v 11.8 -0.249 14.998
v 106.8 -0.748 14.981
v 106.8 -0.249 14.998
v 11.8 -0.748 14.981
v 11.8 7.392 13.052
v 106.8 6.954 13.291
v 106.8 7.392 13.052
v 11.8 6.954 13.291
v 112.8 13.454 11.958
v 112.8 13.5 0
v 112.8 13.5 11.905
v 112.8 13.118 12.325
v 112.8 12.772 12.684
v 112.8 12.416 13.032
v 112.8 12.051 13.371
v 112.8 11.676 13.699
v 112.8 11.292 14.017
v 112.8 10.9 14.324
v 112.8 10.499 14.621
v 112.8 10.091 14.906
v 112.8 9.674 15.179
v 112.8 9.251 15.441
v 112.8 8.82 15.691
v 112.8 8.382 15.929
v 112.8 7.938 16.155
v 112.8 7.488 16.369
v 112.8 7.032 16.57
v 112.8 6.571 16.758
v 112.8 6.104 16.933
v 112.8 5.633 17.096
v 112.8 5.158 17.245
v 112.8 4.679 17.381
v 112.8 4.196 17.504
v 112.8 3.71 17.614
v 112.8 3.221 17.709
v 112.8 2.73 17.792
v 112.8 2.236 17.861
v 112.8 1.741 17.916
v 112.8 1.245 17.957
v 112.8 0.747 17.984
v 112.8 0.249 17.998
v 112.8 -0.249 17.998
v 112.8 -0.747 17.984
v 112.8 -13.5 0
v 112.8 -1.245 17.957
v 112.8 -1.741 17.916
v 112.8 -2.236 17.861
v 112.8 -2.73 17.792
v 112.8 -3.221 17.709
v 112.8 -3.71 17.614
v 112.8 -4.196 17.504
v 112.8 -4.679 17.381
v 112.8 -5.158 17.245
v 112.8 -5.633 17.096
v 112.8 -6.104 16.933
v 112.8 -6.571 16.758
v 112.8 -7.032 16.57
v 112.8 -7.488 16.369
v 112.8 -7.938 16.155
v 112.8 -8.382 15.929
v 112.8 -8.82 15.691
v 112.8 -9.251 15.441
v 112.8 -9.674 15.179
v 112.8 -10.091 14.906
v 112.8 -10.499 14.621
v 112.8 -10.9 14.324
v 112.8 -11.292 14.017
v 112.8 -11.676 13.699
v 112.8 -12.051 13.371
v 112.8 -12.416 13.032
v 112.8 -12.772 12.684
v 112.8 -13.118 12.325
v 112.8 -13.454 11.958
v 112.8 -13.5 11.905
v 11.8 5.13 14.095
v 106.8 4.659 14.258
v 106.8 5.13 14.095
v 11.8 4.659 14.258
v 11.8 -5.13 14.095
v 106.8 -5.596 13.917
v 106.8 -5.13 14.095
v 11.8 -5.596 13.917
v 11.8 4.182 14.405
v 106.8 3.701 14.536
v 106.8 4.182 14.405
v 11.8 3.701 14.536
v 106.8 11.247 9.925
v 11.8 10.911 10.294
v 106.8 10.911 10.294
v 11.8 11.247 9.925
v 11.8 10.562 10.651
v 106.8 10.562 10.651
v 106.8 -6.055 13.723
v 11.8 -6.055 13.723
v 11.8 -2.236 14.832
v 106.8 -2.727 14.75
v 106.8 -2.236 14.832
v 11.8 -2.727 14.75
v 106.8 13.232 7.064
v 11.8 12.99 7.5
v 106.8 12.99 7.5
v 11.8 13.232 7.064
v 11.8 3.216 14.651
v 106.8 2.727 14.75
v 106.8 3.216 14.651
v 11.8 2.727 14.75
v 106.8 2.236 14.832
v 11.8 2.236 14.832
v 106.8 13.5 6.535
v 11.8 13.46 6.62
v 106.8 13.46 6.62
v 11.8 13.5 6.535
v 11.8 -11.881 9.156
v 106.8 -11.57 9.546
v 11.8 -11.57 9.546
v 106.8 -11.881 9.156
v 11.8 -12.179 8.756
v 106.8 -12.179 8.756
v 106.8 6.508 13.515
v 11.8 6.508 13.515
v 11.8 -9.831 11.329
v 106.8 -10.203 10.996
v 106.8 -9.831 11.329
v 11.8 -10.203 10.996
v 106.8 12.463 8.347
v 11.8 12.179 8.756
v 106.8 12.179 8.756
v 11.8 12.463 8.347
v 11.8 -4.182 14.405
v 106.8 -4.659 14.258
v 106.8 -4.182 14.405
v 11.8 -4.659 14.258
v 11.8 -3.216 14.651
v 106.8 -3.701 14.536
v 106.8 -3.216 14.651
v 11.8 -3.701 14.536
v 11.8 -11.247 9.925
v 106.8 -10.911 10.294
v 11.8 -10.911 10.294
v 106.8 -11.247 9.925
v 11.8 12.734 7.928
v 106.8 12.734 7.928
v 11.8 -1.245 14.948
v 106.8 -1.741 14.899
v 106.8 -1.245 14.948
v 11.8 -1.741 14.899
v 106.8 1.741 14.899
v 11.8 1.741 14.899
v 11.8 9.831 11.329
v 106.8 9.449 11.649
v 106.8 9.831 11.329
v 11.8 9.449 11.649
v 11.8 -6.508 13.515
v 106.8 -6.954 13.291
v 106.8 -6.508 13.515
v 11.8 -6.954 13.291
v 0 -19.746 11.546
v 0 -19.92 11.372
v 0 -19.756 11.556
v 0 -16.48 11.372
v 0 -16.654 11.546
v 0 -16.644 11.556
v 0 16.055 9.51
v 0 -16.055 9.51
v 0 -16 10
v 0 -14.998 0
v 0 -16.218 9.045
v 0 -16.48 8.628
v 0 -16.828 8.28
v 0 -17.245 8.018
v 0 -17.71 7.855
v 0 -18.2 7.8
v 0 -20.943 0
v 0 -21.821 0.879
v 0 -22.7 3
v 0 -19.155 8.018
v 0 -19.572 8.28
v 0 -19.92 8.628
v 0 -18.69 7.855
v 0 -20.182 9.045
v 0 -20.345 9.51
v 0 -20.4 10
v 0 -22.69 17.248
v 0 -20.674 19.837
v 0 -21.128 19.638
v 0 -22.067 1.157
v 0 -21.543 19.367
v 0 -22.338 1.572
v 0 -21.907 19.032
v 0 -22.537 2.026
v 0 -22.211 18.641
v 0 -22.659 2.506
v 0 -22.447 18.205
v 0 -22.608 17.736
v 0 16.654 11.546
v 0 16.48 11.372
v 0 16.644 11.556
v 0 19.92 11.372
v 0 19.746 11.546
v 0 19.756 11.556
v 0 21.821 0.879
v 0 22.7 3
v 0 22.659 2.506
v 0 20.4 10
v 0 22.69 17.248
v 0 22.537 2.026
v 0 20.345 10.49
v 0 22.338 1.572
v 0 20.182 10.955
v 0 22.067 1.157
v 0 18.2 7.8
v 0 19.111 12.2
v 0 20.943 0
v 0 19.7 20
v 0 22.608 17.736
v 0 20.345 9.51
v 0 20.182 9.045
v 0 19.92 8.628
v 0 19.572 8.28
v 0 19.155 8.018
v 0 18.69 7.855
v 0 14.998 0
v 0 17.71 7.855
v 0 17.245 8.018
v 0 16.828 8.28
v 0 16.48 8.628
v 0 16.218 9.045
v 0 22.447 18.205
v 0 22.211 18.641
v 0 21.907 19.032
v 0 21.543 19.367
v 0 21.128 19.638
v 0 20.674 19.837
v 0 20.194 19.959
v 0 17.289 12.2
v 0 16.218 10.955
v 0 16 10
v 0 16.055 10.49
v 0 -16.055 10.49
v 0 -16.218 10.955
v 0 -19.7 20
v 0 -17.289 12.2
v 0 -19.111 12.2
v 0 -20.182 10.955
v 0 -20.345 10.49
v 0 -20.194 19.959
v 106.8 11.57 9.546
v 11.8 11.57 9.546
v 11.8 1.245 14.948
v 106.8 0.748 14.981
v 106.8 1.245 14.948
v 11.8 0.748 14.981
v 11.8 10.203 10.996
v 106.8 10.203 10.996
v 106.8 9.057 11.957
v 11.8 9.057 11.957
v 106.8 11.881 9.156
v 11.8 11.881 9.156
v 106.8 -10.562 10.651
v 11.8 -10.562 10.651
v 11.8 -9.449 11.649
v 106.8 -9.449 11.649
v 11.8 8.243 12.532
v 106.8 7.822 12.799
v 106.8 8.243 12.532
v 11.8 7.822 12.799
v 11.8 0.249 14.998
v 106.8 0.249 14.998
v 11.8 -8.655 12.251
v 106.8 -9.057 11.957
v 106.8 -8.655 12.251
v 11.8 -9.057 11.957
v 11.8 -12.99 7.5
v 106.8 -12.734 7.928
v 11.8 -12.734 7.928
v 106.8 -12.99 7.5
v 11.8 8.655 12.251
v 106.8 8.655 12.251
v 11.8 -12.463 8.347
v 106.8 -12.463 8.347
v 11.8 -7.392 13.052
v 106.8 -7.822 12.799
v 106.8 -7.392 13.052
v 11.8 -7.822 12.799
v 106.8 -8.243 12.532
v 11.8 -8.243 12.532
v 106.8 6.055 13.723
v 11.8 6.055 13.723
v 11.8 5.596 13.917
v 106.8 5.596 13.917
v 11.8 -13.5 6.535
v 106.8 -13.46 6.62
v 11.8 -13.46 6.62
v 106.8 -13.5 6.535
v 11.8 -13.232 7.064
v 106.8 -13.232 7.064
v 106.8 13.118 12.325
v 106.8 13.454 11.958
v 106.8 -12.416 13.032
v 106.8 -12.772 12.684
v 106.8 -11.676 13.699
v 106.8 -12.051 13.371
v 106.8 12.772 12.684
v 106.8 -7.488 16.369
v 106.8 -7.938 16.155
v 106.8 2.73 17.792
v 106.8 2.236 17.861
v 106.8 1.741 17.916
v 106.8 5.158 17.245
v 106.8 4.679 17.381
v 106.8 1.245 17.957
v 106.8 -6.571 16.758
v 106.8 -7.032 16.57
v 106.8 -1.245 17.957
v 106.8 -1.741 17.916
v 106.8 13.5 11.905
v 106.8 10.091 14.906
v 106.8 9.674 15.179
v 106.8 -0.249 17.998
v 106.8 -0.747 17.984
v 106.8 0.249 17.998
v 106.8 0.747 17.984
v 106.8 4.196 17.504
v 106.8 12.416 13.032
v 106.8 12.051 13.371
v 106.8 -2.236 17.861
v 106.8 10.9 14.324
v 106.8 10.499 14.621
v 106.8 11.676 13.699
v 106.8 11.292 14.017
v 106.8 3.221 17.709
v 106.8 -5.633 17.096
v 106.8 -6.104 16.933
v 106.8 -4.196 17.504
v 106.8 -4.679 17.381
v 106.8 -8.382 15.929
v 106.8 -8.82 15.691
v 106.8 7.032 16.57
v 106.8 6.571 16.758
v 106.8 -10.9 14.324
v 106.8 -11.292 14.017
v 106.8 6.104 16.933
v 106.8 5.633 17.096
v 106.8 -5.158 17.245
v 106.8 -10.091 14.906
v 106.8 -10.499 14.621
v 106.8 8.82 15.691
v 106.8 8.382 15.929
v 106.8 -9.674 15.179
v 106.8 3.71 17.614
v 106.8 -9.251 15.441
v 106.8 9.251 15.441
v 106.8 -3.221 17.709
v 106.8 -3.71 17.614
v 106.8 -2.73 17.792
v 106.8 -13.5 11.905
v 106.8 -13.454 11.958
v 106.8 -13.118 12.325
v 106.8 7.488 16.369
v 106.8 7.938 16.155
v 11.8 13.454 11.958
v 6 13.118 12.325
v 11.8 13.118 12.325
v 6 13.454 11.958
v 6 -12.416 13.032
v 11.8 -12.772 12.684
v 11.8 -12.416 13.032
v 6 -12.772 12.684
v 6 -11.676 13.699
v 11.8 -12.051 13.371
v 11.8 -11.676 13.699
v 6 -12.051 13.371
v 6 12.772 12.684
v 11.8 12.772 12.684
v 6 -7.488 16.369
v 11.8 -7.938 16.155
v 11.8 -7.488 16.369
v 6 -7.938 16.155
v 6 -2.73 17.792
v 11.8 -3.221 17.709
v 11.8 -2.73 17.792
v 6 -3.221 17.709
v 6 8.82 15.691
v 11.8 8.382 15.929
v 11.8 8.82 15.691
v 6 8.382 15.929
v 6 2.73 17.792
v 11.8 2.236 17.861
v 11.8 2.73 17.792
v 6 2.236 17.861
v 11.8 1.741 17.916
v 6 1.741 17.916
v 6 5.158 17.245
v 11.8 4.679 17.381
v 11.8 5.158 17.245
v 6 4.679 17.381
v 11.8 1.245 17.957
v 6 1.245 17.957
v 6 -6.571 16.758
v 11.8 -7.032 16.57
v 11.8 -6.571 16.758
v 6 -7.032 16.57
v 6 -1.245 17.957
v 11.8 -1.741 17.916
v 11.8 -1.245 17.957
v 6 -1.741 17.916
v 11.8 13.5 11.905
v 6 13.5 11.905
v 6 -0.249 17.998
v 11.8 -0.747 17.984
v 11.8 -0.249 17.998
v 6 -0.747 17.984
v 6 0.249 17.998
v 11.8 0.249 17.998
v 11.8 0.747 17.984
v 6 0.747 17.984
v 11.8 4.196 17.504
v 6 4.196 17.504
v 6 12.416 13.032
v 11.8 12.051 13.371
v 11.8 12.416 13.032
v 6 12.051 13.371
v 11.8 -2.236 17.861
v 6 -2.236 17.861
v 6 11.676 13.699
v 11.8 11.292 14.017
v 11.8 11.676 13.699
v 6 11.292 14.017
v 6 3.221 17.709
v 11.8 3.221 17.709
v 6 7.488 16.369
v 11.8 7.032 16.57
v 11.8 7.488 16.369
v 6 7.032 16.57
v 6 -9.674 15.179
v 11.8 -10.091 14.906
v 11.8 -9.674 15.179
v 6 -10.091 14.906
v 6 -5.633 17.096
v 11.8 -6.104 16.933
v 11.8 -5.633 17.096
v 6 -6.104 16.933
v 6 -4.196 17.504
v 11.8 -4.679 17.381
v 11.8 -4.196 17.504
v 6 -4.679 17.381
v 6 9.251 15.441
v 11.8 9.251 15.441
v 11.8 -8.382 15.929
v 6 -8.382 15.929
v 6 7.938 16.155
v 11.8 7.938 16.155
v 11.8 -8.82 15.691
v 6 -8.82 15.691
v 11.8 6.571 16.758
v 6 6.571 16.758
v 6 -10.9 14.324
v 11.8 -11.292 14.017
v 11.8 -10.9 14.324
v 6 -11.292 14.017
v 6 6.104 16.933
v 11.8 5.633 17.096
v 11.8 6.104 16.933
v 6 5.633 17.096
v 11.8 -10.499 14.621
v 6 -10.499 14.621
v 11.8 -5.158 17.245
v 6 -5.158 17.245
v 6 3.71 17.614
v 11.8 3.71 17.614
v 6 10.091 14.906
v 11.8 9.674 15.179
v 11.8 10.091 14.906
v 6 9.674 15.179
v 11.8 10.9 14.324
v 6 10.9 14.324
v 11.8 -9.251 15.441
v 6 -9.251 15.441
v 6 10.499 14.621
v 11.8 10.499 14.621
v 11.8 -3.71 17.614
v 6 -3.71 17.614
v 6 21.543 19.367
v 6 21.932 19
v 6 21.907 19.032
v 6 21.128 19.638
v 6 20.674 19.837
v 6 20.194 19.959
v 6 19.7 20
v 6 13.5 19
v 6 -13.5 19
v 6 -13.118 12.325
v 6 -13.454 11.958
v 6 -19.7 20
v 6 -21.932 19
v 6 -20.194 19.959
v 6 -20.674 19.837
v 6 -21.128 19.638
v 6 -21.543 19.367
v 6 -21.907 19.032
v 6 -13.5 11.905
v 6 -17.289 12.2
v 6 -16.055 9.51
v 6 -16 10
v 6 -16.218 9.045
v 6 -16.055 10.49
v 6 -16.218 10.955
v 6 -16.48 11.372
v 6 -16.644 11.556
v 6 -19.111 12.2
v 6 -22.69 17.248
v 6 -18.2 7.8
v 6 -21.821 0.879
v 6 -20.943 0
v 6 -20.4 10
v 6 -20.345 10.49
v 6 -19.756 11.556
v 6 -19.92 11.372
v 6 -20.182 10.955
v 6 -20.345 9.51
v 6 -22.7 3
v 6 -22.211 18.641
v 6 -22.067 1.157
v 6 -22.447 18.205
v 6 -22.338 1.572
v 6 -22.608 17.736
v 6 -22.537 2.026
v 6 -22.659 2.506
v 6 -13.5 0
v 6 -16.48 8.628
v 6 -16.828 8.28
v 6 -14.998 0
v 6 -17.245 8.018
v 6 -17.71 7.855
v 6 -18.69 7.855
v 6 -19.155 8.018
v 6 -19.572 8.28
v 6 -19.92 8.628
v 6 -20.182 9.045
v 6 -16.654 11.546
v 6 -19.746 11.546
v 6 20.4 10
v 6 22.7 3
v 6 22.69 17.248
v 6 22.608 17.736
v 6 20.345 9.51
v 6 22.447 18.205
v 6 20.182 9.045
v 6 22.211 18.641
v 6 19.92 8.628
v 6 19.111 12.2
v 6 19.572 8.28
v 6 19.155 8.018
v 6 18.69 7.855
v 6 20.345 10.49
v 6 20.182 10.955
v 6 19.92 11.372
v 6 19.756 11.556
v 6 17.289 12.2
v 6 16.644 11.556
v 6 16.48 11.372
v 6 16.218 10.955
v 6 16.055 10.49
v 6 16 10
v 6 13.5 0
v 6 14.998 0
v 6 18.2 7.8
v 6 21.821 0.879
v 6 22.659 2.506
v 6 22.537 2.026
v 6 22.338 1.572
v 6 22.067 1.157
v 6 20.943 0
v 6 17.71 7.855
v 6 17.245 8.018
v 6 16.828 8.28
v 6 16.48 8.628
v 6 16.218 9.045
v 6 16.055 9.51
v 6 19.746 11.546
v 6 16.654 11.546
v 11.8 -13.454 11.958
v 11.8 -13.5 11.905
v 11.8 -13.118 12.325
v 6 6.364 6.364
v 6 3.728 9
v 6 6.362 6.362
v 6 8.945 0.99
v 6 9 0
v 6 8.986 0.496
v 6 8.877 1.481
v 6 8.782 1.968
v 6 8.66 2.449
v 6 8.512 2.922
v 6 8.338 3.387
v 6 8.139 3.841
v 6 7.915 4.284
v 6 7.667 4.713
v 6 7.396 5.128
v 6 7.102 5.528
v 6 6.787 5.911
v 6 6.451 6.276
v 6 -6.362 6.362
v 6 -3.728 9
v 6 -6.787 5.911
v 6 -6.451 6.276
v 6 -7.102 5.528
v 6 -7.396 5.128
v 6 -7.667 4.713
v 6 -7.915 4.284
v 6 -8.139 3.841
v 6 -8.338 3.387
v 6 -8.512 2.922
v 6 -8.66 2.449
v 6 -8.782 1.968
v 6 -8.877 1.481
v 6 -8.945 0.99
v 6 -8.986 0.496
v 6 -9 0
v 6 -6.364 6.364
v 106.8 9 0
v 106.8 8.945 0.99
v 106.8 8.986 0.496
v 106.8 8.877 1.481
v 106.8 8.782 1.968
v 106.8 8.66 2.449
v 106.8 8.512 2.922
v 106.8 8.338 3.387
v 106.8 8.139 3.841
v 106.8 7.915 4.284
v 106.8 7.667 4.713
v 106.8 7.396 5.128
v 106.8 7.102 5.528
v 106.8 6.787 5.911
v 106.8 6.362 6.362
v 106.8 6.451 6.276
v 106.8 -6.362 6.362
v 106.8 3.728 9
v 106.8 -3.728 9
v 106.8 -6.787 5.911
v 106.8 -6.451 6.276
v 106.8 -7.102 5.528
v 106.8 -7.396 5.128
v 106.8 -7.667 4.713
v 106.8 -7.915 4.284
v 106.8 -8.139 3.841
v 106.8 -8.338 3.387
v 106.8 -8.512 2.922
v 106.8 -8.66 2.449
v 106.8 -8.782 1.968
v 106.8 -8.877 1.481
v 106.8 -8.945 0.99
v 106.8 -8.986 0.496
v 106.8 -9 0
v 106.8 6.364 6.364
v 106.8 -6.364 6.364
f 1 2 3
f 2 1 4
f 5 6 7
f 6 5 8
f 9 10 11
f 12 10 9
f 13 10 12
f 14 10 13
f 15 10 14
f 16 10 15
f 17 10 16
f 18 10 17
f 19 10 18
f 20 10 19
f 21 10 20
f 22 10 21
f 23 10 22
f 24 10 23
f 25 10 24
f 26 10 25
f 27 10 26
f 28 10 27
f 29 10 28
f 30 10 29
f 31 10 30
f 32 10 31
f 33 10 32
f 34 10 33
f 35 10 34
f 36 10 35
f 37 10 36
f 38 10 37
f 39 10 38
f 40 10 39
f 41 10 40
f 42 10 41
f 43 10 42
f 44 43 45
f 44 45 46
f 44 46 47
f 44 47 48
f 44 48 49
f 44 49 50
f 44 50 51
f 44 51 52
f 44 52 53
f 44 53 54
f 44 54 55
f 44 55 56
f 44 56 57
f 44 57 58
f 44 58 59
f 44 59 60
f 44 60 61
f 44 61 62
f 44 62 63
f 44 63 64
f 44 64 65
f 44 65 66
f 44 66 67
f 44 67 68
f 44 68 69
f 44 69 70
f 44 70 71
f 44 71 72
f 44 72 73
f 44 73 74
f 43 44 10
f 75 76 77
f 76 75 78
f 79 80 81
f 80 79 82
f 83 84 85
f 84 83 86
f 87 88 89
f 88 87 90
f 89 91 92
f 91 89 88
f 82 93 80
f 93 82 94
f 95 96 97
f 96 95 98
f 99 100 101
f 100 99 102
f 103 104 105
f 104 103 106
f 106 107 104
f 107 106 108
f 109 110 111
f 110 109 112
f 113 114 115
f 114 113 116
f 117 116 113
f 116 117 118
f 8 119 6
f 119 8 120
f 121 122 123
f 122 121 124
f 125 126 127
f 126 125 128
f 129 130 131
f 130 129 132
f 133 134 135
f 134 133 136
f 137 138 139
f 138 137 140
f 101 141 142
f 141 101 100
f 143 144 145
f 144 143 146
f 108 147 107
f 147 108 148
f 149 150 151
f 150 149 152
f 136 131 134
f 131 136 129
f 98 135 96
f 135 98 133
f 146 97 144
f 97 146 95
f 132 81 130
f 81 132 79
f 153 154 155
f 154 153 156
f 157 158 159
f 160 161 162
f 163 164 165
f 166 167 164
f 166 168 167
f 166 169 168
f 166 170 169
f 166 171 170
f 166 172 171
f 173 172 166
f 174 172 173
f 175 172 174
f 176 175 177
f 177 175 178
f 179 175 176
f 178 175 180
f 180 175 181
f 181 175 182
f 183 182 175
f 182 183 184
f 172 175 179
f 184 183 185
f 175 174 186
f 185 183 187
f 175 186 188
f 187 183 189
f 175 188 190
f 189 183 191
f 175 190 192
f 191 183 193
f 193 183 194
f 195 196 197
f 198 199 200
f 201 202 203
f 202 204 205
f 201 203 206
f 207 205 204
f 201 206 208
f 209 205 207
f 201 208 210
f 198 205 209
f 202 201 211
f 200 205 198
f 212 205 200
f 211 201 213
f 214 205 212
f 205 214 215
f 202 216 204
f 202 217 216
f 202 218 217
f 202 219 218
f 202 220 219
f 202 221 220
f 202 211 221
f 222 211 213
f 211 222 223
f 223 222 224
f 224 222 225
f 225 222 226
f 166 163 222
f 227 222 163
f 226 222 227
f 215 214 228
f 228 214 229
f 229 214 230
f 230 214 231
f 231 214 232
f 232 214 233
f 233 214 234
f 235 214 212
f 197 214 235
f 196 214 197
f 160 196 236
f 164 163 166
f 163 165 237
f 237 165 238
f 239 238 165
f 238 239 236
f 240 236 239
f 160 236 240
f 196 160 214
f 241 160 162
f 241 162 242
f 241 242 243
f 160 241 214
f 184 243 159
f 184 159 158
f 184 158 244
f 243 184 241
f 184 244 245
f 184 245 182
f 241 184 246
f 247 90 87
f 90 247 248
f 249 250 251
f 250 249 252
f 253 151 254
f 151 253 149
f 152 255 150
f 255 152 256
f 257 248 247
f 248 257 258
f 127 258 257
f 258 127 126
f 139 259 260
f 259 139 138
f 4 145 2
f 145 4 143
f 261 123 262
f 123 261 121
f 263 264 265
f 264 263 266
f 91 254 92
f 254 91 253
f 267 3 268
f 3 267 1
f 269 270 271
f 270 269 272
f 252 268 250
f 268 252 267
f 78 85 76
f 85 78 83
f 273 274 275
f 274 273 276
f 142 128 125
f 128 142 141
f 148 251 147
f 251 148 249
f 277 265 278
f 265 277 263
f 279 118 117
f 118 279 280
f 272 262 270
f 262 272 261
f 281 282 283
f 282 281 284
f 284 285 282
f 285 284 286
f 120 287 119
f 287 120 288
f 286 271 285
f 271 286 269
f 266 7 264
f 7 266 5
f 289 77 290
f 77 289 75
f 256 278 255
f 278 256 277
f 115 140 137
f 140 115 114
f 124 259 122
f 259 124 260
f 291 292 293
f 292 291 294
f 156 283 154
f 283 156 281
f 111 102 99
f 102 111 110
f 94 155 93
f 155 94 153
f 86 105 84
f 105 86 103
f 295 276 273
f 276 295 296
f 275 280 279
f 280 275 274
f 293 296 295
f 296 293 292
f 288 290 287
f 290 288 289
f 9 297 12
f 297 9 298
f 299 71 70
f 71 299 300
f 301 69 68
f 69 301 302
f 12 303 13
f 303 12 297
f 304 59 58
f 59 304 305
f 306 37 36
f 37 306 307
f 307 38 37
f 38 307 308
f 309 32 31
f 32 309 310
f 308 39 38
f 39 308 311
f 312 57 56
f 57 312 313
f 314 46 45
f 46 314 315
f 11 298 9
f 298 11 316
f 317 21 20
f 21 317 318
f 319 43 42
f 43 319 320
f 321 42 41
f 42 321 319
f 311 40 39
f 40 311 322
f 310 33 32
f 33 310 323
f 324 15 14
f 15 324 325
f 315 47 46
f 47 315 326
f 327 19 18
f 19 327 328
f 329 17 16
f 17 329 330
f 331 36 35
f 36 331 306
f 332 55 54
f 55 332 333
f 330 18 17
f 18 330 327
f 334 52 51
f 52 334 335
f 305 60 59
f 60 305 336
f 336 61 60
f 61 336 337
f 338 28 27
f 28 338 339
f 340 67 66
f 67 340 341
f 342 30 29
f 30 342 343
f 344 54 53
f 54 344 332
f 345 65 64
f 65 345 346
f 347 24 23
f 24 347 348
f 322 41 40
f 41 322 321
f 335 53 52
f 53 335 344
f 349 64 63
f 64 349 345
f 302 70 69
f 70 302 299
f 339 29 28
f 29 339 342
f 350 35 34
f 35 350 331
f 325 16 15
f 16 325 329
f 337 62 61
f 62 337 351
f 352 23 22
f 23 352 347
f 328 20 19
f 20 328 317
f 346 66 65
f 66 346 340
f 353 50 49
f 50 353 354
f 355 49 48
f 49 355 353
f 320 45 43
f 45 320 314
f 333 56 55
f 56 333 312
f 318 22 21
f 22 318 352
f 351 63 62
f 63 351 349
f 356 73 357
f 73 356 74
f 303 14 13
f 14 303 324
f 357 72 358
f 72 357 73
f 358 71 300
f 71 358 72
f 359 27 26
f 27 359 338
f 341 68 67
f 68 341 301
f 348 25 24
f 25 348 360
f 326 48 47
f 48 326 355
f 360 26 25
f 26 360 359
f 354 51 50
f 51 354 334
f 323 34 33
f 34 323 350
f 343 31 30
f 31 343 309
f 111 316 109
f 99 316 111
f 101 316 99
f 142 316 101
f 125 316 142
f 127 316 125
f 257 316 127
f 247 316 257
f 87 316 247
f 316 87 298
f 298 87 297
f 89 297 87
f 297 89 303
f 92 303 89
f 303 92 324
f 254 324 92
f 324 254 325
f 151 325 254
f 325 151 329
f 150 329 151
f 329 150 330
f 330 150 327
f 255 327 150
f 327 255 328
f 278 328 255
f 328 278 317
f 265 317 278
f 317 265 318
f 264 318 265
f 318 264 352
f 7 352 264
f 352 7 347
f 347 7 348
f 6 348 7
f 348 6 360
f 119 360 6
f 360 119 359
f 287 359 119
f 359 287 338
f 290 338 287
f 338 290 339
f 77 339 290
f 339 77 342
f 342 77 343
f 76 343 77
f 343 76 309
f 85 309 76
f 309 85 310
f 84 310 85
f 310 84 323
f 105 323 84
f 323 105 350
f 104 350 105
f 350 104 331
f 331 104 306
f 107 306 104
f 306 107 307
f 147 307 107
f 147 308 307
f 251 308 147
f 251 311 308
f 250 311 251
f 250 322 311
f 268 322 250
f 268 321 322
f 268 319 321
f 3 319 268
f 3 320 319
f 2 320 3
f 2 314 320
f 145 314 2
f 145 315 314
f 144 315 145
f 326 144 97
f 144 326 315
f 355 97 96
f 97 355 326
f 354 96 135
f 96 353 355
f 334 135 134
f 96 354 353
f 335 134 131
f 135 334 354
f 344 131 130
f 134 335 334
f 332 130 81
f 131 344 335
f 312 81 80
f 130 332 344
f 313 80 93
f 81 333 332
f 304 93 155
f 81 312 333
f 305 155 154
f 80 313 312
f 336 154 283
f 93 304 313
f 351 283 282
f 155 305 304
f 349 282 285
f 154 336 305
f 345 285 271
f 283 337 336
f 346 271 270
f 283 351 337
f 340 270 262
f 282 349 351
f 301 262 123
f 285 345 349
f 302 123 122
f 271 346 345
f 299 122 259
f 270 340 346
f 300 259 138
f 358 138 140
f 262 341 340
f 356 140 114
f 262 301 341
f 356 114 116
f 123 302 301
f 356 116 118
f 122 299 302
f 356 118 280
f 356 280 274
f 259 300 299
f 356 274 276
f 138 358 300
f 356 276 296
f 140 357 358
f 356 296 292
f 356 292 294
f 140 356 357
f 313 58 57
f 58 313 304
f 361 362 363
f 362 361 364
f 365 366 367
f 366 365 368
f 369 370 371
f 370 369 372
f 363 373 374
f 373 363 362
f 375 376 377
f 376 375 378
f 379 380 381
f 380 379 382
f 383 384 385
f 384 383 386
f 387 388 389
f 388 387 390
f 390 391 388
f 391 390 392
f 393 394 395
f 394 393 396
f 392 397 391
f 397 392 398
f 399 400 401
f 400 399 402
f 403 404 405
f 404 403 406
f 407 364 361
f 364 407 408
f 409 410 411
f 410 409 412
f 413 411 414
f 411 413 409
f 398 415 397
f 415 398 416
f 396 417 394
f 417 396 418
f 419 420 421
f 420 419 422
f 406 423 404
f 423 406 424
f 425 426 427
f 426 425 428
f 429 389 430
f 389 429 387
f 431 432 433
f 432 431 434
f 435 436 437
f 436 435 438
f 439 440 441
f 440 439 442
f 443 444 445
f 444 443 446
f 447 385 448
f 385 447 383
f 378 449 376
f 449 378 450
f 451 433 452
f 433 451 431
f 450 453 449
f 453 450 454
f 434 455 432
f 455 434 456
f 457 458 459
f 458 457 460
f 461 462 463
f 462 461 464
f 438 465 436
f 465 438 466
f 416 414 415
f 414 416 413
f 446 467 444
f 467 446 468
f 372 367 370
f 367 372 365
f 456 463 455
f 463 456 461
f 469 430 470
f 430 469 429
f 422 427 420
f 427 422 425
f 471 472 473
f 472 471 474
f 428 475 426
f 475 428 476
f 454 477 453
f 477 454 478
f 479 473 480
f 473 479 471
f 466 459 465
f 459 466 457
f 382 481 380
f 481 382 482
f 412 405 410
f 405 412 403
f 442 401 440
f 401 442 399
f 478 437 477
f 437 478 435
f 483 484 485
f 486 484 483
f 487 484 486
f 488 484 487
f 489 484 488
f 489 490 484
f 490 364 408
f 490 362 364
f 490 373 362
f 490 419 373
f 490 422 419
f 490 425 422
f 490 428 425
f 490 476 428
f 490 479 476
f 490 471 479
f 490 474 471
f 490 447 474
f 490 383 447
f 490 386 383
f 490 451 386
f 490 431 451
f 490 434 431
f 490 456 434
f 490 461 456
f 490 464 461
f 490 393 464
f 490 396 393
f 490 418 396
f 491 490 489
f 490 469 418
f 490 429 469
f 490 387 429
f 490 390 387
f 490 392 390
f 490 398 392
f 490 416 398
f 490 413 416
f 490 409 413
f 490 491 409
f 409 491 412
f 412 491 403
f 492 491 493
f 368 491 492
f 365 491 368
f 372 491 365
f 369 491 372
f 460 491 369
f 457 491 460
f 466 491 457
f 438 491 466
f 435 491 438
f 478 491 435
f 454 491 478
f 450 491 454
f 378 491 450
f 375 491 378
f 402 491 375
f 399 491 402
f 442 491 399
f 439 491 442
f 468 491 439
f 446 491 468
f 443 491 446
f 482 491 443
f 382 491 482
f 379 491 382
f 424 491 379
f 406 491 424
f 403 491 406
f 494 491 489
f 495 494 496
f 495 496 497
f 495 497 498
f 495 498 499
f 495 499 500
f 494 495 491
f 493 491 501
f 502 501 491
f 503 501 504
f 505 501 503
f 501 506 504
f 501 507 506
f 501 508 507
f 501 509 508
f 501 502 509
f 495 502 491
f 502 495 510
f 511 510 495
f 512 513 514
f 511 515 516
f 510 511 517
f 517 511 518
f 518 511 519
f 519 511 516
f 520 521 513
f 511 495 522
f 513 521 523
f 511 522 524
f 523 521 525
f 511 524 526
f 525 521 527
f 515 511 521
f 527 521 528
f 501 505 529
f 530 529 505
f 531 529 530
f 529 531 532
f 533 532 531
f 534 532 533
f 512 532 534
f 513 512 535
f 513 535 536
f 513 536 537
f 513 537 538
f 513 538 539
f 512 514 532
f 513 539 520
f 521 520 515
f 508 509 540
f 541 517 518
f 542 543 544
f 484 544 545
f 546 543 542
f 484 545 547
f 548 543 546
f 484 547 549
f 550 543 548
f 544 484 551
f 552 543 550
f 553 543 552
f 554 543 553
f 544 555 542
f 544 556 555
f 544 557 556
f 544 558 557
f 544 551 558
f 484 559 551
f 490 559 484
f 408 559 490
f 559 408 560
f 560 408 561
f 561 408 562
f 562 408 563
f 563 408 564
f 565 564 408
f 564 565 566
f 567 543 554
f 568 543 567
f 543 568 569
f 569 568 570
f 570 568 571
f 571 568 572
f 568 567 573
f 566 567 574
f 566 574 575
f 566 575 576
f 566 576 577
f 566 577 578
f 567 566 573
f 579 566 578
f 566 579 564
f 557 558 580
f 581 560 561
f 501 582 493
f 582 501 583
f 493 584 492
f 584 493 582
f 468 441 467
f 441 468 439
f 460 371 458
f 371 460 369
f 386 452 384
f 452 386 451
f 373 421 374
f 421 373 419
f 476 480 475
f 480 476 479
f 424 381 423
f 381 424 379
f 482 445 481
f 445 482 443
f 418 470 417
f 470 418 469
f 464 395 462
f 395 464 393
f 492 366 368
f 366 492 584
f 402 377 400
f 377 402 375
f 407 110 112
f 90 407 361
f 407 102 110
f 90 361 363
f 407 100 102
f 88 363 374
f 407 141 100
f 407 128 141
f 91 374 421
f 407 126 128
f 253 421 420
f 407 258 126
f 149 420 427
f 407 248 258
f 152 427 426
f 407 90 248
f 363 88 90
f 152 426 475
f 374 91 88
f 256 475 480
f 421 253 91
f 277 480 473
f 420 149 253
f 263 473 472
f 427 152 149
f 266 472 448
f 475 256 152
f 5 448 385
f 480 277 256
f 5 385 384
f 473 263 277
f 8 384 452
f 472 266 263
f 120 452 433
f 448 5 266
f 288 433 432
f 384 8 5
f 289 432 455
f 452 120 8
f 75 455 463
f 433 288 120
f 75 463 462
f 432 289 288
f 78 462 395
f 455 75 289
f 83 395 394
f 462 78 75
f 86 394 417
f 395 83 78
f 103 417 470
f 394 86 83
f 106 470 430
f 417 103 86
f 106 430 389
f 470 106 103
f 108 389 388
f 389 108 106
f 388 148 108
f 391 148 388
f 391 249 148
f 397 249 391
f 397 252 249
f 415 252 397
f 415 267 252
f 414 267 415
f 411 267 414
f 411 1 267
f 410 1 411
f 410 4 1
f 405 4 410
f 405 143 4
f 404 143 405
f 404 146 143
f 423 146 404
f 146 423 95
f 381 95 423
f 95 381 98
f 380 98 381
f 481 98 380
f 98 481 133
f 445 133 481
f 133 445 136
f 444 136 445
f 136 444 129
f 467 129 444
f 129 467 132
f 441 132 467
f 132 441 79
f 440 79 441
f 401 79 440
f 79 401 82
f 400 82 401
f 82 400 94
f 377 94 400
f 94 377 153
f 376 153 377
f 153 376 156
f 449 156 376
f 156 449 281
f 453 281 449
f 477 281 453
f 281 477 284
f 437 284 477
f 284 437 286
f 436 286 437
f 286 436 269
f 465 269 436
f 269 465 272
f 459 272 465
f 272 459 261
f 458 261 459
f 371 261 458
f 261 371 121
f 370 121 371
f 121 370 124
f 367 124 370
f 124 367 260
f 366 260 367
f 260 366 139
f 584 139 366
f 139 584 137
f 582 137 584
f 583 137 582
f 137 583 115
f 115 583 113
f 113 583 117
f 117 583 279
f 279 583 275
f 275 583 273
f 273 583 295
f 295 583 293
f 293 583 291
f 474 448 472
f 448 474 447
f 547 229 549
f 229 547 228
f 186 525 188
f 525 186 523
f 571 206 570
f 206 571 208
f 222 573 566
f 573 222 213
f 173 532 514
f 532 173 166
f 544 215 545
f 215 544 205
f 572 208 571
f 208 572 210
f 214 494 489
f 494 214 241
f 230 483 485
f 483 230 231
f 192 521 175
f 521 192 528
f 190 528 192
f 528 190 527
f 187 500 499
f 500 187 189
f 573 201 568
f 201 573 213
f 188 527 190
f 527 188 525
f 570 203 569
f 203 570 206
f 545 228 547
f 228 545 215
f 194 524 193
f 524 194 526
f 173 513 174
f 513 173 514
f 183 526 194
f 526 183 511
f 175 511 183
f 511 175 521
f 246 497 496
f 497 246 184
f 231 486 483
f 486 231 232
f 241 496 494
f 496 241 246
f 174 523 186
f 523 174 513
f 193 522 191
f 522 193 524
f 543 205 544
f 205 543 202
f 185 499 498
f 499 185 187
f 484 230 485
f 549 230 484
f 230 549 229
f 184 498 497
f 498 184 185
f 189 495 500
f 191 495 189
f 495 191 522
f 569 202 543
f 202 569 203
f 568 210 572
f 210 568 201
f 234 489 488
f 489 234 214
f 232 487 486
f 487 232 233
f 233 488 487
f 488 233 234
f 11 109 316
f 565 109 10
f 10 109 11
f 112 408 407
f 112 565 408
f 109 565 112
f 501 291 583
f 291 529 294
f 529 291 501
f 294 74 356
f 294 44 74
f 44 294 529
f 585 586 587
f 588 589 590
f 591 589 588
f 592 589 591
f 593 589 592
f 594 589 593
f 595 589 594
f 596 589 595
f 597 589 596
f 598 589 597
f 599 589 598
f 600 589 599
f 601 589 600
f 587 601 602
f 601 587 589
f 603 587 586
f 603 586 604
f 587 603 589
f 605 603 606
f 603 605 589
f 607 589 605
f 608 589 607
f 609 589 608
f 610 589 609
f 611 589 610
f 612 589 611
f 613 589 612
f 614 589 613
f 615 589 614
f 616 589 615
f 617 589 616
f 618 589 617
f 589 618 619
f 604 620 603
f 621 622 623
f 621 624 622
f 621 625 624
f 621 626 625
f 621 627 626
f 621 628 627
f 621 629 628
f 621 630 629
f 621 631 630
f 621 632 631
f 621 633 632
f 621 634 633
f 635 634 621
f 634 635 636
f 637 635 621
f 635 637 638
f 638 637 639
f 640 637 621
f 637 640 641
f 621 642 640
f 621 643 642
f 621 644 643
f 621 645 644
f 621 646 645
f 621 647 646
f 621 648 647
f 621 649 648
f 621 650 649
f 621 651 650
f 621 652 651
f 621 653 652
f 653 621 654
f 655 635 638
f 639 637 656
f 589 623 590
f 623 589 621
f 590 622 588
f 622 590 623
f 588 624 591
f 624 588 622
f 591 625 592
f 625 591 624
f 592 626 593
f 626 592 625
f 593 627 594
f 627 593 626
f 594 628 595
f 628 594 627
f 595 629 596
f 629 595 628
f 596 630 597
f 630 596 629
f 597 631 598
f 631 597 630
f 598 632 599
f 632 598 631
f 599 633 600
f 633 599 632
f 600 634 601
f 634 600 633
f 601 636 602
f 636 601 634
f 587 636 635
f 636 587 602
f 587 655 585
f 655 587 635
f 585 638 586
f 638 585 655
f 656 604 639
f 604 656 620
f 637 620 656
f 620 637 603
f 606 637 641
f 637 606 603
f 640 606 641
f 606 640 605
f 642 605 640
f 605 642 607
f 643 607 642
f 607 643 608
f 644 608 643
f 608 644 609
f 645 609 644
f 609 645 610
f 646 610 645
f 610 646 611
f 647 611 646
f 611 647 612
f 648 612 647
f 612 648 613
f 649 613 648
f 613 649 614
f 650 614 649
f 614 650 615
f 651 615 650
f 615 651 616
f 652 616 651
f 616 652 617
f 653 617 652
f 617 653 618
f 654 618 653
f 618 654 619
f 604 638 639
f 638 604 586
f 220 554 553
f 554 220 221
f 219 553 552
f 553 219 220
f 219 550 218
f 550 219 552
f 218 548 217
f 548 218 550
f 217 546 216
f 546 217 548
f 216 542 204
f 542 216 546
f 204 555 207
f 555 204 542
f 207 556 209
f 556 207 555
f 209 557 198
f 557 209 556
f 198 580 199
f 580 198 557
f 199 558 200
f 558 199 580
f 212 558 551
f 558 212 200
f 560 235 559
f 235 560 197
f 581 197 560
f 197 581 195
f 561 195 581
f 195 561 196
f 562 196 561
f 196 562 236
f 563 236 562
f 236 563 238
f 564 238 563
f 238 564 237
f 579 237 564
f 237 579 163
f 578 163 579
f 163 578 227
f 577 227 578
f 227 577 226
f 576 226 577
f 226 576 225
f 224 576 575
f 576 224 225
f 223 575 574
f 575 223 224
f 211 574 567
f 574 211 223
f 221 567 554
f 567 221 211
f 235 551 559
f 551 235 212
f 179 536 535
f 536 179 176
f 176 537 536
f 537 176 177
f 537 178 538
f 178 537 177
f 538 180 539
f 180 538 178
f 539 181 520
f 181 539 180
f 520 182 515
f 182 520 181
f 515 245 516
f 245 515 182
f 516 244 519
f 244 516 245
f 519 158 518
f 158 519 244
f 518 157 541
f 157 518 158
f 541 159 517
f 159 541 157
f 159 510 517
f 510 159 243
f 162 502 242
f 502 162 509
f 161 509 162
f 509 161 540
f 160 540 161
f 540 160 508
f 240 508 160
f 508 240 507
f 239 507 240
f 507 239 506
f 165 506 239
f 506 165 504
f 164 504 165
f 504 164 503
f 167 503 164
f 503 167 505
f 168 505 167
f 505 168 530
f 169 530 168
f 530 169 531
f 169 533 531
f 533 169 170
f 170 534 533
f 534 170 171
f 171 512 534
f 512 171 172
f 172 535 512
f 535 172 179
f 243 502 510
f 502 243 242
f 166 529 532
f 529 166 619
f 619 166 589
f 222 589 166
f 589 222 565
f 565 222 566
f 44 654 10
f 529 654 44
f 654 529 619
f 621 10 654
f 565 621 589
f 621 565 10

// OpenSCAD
// file: functions.scad
/*******************************************************************

This OpenSCAD code and its rendered 3D model are part of the

	Kühling&Kühling RepRap Industrial 3D Printer


All details, BOM, assembling instructions and latest sources:
	http://kuehlingkuehling.de

Designed and developed by:
	Jonas Kühling <mail@jonaskuehling.de>
	Simon Kühling <mail@simonkuehling.de>

Licensed under:
	Creative Commons Attribution-ShareAlike
	CC BY-SA 3.0
	http://creativecommons.org/licenses/by-sa/3.0/

*******************************************************************/

module teardrop (r=4.5,h=20,alpha=45,teardropcorner=0,fulldrop=0){		// tear drop hole for top-centering
											// use teardropcorner=1 for bottom horizontal corners
	render()
	translate([-h/2,0,0])
		rotate([-270,0+(teardropcorner*180),90])
			difference(){
				linear_extrude(height=h){
					circle(r);
					polygon(points=[[0,0],[r*cos(alpha),r*sin(alpha)],[0,r/sin(alpha)],[-r*cos(alpha),r*sin(alpha)]], paths=[[0,1,2,3]]);
				}
				if(fulldrop==0) 
					translate([0,(r/sin(alpha))/2+r,h/2]) cube([2*r+2,r/sin(alpha),h+2],center=true);
			}
}

//teardrop(4.5,22,fulldrop=true);



module teardropcentering (r=4.5,h=20,alpha=45){				// tear drop hole for top-centering
	centering_offset_factor = 1.1;
	render()
	translate([-h/2,0,0])
		rotate([-270,0,90])
			difference(){
				linear_extrude(height=h){
					circle(r, $fn=24);
					polygon(points=[[0,0],[r*cos(alpha),r*sin(alpha)],[0,r/sin(alpha)],[-r*cos(alpha),r*sin(alpha)]], paths=[[0,1,2,3]]);
				}
				translate([0,(r/sin(alpha))/2+r*centering_offset_factor,h/2]) cube([2*r+2,r/sin(alpha),h+2],center=true);
			}
}

//teardropcentering();



module teardropcentering_half (r=4.5,h=20, bottom=0,alpha=45){				// tear drop hole for top-centering
																// upper half (bottom=0) or bottom half (bottom=1)
	centering_offset_factor = 1.2;
	render()
	translate([-h/2,0,0])
		rotate([-270,0,90])
			difference(){
				linear_extrude(height=h){
					circle(r, $fn=24);
					polygon(points=[[0,0],[r*cos(alpha),r*sin(alpha)],[0,r/sin(alpha)],[-r*cos(alpha),r*sin(alpha)]], paths=[[0,1,2,3]]);
				}
				translate([0,(r/sin(alpha))/2+r*centering_offset_factor,h/2]) cube([2*r+2,r/sin(alpha),h+2],center=true);
				translate([0,-(r*centering_offset_factor)/2-0.5+bottom*(r*centering_offset_factor+1),h/2]) cube([2*r+2,r*centering_offset_factor+1,h+2],center=true);
			}
}

//teardropcentering_half(bottom=0);


module polyhole(d,h){
	n = max(round(2 * d),3);
	cylinder(h = h, r = (d / 2) / cos (180 / n), $fn = n, center=true);
}



module roundcorner(radius,edge_length){
	render()
	translate([0,0,-1])
		difference(){
			translate([-1,-1,0])
				cube(size = [radius+1,radius+1,edge_length+2], center = false);
			translate(v = [radius,radius,-1])
				cylinder(h = edge_length+4, r=radius, center=false,$fs=0.1);
		}
}

//roundcorner(5,5);



module roundcorner_tear(radius,edge_length){
	render()
	difference(){
		translate([-1,-1,-1])
			cube(size = [edge_length+2, radius+1, radius+1], center = false);
		translate([(edge_length+4)/2-2, radius, radius])
			teardrop(radius, edge_length+4,teardropcorner=1);
	}
}

//roundcorner_tear(8,20);


module roundedge_tear(radius){
	render()
	difference(){
		translate([-1,-1,-1])
			cube(size = [radius+1, radius+1, radius+1], center = false);
		translate([radius,radius,radius])
			union(){
				sphere(r=radius, $fs=0.1);
				translate([0,0,-radius])
					cylinder(r1=(radius*sin(45))-(radius-(radius*sin(45))),r2=radius*sin(45),h=(radius-(radius*sin(45))), $fs=0.1);
			}
	}
}

//roundedge_tear(20);



module roundedge(radius){
	render()
	difference(){
		translate([-1,-1,-1])
			cube(size = [radius+1, radius+1, radius+1], center = false);
		translate([radius,radius,radius])
			sphere(r=radius, $fs=0.1);
	}
}

//roundedge(5);


module nut_trap(nut_wrench_size,trap_height,vertical=0, clearance=0.2,center=true){		// M3 wrench size = 5.5
	radius = cornerdiameter(nut_wrench_size+2*clearance) /2;
	rotate([0,vertical*90,0])
		cylinder(h = trap_height, r = radius, center=center, $fn = 6);
}

//nut_trap(5,5,0);

module nut_slot(nut_wrench_size,nut_height, nut_elevation,vertical=0, clearance=0.2){		// M3 wrench size = 5.5
	radius = cornerdiameter(nut_wrench_size+2*clearance) /2;
	slot_height = nut_height+2*clearance;
	slot_width = nut_wrench_size+2*clearance;
	rotate([0,vertical*270,0]){
		cylinder(h = slot_height, r = radius, center=true, $fn = 6);
		translate([0,-slot_width/2,-slot_height/2]) cube([nut_elevation+1,slot_width,slot_height]);
	}
}

//nut_slot(5.5,3,4,1);

function cornerdiameter(wrench_size) =  2* ((wrench_size)/2)/ cos(180/6);
function cornerdiameter_8(wrench_size) =  2* ((wrench_size)/2)/ cos(180/8);
// main file
/*******************************************************************

This OpenSCAD code and its rendered 3D model are part of the

	Kühling&Kühling RepRap Industrial 3D Printer


All details, BOM, assembling instructions and latest sources:
	http://kuehlingkuehling.de

Designed and developed by:
	Jonas Kühling <mail@jonaskuehling.de>
	Simon Kühling <mail@simonkuehling.de>

Licensed under:
	Creative Commons Attribution-ShareAlike
	CC BY-SA 3.0
	http://creativecommons.org/licenses/by-sa/3.0/

*******************************************************************/

include <configuration.scad>

filament_spool_mount_width = 95;
filament_spool_mount_dia = 30;


spool_mount();


module spool_mount(){
	difference(){

		// main body
		union(){
			rotate([0,90,0])
				cylinder(r=filament_spool_mount_dia/2,h=2*wall+frame_screw_washer_thickness+frame_screw_head_length+wall_thin+filament_spool_mount_width+2*wall);
			translate([2*wall+frame_screw_washer_thickness+frame_screw_head_length+wall_thin+filament_spool_mount_width,0,0])
				rotate([0,90,0])
					cylinder(r=filament_spool_mount_dia/2+wall,h=2*wall);
			translate([2*wall,0,0])
				rotate([0,90,0])
					cylinder(r=filament_spool_mount_dia/2+wall,h=frame_screw_washer_thickness+frame_screw_head_length+wall_thin);
			hull(){
				translate([0,-filament_spool_mount_dia/2+wall/2-clearance-frame_screw_washer_dia+wall,frame_width-wall])
					rotate([0,90,0])
						cylinder(r=wall,h=2*wall);
				translate([0,filament_spool_mount_dia/2-wall/2+clearance+frame_screw_washer_dia-wall,frame_width-wall])
					rotate([0,90,0])
						cylinder(r=wall,h=2*wall);
				translate([wall,-filament_spool_mount_dia/2+wall/2-clearance-frame_screw_washer_dia+wall,wall])
					rotate([180,0,0])
						teardrop(wall,2*wall);
				translate([wall,filament_spool_mount_dia/2-wall/2+clearance+frame_screw_washer_dia-wall,wall])
					rotate([180,0,0])
						teardrop(wall,2*wall);
			}
		}

		// cylinder cut off
		translate([-1,-(filament_spool_mount_dia+2*wall+2)/2,-filament_spool_mount_dia/2-wall-1])
			cube([2*wall+frame_screw_washer_thickness+frame_screw_head_length+wall_thin+filament_spool_mount_width+2*wall+2,filament_spool_mount_dia+2*wall+2,filament_spool_mount_dia/2+wall+1]);
		for(i=[0,1])
			mirror([0,i,0])
				translate([2*wall,filament_spool_mount_dia/2-wall/2,-1])
					cube([frame_screw_washer_thickness+frame_screw_head_length+wall_thin+filament_spool_mount_width+2*wall+2,filament_spool_mount_dia+2*wall+2,filament_spool_mount_dia/2+wall+2]);
		translate([(frame_screw_washer_thickness+frame_screw_head_length+wall_thin+filament_spool_mount_width)/2+2*wall,0,0])
			teardrop(filament_spool_mount_dia/2-2*wall,frame_screw_washer_thickness+frame_screw_head_length+wall_thin+filament_spool_mount_width);

		// frame mount screw holes
		for(i=[0,1])
			mirror([0,i,0])
				translate([(2*wall+1)/2-1,filament_spool_mount_dia/2-wall/2+clearance+frame_screw_washer_dia/2,frame_width/2])
					teardrop(frame_screw_dia/2+clearance,2*wall+2);


	}
}
